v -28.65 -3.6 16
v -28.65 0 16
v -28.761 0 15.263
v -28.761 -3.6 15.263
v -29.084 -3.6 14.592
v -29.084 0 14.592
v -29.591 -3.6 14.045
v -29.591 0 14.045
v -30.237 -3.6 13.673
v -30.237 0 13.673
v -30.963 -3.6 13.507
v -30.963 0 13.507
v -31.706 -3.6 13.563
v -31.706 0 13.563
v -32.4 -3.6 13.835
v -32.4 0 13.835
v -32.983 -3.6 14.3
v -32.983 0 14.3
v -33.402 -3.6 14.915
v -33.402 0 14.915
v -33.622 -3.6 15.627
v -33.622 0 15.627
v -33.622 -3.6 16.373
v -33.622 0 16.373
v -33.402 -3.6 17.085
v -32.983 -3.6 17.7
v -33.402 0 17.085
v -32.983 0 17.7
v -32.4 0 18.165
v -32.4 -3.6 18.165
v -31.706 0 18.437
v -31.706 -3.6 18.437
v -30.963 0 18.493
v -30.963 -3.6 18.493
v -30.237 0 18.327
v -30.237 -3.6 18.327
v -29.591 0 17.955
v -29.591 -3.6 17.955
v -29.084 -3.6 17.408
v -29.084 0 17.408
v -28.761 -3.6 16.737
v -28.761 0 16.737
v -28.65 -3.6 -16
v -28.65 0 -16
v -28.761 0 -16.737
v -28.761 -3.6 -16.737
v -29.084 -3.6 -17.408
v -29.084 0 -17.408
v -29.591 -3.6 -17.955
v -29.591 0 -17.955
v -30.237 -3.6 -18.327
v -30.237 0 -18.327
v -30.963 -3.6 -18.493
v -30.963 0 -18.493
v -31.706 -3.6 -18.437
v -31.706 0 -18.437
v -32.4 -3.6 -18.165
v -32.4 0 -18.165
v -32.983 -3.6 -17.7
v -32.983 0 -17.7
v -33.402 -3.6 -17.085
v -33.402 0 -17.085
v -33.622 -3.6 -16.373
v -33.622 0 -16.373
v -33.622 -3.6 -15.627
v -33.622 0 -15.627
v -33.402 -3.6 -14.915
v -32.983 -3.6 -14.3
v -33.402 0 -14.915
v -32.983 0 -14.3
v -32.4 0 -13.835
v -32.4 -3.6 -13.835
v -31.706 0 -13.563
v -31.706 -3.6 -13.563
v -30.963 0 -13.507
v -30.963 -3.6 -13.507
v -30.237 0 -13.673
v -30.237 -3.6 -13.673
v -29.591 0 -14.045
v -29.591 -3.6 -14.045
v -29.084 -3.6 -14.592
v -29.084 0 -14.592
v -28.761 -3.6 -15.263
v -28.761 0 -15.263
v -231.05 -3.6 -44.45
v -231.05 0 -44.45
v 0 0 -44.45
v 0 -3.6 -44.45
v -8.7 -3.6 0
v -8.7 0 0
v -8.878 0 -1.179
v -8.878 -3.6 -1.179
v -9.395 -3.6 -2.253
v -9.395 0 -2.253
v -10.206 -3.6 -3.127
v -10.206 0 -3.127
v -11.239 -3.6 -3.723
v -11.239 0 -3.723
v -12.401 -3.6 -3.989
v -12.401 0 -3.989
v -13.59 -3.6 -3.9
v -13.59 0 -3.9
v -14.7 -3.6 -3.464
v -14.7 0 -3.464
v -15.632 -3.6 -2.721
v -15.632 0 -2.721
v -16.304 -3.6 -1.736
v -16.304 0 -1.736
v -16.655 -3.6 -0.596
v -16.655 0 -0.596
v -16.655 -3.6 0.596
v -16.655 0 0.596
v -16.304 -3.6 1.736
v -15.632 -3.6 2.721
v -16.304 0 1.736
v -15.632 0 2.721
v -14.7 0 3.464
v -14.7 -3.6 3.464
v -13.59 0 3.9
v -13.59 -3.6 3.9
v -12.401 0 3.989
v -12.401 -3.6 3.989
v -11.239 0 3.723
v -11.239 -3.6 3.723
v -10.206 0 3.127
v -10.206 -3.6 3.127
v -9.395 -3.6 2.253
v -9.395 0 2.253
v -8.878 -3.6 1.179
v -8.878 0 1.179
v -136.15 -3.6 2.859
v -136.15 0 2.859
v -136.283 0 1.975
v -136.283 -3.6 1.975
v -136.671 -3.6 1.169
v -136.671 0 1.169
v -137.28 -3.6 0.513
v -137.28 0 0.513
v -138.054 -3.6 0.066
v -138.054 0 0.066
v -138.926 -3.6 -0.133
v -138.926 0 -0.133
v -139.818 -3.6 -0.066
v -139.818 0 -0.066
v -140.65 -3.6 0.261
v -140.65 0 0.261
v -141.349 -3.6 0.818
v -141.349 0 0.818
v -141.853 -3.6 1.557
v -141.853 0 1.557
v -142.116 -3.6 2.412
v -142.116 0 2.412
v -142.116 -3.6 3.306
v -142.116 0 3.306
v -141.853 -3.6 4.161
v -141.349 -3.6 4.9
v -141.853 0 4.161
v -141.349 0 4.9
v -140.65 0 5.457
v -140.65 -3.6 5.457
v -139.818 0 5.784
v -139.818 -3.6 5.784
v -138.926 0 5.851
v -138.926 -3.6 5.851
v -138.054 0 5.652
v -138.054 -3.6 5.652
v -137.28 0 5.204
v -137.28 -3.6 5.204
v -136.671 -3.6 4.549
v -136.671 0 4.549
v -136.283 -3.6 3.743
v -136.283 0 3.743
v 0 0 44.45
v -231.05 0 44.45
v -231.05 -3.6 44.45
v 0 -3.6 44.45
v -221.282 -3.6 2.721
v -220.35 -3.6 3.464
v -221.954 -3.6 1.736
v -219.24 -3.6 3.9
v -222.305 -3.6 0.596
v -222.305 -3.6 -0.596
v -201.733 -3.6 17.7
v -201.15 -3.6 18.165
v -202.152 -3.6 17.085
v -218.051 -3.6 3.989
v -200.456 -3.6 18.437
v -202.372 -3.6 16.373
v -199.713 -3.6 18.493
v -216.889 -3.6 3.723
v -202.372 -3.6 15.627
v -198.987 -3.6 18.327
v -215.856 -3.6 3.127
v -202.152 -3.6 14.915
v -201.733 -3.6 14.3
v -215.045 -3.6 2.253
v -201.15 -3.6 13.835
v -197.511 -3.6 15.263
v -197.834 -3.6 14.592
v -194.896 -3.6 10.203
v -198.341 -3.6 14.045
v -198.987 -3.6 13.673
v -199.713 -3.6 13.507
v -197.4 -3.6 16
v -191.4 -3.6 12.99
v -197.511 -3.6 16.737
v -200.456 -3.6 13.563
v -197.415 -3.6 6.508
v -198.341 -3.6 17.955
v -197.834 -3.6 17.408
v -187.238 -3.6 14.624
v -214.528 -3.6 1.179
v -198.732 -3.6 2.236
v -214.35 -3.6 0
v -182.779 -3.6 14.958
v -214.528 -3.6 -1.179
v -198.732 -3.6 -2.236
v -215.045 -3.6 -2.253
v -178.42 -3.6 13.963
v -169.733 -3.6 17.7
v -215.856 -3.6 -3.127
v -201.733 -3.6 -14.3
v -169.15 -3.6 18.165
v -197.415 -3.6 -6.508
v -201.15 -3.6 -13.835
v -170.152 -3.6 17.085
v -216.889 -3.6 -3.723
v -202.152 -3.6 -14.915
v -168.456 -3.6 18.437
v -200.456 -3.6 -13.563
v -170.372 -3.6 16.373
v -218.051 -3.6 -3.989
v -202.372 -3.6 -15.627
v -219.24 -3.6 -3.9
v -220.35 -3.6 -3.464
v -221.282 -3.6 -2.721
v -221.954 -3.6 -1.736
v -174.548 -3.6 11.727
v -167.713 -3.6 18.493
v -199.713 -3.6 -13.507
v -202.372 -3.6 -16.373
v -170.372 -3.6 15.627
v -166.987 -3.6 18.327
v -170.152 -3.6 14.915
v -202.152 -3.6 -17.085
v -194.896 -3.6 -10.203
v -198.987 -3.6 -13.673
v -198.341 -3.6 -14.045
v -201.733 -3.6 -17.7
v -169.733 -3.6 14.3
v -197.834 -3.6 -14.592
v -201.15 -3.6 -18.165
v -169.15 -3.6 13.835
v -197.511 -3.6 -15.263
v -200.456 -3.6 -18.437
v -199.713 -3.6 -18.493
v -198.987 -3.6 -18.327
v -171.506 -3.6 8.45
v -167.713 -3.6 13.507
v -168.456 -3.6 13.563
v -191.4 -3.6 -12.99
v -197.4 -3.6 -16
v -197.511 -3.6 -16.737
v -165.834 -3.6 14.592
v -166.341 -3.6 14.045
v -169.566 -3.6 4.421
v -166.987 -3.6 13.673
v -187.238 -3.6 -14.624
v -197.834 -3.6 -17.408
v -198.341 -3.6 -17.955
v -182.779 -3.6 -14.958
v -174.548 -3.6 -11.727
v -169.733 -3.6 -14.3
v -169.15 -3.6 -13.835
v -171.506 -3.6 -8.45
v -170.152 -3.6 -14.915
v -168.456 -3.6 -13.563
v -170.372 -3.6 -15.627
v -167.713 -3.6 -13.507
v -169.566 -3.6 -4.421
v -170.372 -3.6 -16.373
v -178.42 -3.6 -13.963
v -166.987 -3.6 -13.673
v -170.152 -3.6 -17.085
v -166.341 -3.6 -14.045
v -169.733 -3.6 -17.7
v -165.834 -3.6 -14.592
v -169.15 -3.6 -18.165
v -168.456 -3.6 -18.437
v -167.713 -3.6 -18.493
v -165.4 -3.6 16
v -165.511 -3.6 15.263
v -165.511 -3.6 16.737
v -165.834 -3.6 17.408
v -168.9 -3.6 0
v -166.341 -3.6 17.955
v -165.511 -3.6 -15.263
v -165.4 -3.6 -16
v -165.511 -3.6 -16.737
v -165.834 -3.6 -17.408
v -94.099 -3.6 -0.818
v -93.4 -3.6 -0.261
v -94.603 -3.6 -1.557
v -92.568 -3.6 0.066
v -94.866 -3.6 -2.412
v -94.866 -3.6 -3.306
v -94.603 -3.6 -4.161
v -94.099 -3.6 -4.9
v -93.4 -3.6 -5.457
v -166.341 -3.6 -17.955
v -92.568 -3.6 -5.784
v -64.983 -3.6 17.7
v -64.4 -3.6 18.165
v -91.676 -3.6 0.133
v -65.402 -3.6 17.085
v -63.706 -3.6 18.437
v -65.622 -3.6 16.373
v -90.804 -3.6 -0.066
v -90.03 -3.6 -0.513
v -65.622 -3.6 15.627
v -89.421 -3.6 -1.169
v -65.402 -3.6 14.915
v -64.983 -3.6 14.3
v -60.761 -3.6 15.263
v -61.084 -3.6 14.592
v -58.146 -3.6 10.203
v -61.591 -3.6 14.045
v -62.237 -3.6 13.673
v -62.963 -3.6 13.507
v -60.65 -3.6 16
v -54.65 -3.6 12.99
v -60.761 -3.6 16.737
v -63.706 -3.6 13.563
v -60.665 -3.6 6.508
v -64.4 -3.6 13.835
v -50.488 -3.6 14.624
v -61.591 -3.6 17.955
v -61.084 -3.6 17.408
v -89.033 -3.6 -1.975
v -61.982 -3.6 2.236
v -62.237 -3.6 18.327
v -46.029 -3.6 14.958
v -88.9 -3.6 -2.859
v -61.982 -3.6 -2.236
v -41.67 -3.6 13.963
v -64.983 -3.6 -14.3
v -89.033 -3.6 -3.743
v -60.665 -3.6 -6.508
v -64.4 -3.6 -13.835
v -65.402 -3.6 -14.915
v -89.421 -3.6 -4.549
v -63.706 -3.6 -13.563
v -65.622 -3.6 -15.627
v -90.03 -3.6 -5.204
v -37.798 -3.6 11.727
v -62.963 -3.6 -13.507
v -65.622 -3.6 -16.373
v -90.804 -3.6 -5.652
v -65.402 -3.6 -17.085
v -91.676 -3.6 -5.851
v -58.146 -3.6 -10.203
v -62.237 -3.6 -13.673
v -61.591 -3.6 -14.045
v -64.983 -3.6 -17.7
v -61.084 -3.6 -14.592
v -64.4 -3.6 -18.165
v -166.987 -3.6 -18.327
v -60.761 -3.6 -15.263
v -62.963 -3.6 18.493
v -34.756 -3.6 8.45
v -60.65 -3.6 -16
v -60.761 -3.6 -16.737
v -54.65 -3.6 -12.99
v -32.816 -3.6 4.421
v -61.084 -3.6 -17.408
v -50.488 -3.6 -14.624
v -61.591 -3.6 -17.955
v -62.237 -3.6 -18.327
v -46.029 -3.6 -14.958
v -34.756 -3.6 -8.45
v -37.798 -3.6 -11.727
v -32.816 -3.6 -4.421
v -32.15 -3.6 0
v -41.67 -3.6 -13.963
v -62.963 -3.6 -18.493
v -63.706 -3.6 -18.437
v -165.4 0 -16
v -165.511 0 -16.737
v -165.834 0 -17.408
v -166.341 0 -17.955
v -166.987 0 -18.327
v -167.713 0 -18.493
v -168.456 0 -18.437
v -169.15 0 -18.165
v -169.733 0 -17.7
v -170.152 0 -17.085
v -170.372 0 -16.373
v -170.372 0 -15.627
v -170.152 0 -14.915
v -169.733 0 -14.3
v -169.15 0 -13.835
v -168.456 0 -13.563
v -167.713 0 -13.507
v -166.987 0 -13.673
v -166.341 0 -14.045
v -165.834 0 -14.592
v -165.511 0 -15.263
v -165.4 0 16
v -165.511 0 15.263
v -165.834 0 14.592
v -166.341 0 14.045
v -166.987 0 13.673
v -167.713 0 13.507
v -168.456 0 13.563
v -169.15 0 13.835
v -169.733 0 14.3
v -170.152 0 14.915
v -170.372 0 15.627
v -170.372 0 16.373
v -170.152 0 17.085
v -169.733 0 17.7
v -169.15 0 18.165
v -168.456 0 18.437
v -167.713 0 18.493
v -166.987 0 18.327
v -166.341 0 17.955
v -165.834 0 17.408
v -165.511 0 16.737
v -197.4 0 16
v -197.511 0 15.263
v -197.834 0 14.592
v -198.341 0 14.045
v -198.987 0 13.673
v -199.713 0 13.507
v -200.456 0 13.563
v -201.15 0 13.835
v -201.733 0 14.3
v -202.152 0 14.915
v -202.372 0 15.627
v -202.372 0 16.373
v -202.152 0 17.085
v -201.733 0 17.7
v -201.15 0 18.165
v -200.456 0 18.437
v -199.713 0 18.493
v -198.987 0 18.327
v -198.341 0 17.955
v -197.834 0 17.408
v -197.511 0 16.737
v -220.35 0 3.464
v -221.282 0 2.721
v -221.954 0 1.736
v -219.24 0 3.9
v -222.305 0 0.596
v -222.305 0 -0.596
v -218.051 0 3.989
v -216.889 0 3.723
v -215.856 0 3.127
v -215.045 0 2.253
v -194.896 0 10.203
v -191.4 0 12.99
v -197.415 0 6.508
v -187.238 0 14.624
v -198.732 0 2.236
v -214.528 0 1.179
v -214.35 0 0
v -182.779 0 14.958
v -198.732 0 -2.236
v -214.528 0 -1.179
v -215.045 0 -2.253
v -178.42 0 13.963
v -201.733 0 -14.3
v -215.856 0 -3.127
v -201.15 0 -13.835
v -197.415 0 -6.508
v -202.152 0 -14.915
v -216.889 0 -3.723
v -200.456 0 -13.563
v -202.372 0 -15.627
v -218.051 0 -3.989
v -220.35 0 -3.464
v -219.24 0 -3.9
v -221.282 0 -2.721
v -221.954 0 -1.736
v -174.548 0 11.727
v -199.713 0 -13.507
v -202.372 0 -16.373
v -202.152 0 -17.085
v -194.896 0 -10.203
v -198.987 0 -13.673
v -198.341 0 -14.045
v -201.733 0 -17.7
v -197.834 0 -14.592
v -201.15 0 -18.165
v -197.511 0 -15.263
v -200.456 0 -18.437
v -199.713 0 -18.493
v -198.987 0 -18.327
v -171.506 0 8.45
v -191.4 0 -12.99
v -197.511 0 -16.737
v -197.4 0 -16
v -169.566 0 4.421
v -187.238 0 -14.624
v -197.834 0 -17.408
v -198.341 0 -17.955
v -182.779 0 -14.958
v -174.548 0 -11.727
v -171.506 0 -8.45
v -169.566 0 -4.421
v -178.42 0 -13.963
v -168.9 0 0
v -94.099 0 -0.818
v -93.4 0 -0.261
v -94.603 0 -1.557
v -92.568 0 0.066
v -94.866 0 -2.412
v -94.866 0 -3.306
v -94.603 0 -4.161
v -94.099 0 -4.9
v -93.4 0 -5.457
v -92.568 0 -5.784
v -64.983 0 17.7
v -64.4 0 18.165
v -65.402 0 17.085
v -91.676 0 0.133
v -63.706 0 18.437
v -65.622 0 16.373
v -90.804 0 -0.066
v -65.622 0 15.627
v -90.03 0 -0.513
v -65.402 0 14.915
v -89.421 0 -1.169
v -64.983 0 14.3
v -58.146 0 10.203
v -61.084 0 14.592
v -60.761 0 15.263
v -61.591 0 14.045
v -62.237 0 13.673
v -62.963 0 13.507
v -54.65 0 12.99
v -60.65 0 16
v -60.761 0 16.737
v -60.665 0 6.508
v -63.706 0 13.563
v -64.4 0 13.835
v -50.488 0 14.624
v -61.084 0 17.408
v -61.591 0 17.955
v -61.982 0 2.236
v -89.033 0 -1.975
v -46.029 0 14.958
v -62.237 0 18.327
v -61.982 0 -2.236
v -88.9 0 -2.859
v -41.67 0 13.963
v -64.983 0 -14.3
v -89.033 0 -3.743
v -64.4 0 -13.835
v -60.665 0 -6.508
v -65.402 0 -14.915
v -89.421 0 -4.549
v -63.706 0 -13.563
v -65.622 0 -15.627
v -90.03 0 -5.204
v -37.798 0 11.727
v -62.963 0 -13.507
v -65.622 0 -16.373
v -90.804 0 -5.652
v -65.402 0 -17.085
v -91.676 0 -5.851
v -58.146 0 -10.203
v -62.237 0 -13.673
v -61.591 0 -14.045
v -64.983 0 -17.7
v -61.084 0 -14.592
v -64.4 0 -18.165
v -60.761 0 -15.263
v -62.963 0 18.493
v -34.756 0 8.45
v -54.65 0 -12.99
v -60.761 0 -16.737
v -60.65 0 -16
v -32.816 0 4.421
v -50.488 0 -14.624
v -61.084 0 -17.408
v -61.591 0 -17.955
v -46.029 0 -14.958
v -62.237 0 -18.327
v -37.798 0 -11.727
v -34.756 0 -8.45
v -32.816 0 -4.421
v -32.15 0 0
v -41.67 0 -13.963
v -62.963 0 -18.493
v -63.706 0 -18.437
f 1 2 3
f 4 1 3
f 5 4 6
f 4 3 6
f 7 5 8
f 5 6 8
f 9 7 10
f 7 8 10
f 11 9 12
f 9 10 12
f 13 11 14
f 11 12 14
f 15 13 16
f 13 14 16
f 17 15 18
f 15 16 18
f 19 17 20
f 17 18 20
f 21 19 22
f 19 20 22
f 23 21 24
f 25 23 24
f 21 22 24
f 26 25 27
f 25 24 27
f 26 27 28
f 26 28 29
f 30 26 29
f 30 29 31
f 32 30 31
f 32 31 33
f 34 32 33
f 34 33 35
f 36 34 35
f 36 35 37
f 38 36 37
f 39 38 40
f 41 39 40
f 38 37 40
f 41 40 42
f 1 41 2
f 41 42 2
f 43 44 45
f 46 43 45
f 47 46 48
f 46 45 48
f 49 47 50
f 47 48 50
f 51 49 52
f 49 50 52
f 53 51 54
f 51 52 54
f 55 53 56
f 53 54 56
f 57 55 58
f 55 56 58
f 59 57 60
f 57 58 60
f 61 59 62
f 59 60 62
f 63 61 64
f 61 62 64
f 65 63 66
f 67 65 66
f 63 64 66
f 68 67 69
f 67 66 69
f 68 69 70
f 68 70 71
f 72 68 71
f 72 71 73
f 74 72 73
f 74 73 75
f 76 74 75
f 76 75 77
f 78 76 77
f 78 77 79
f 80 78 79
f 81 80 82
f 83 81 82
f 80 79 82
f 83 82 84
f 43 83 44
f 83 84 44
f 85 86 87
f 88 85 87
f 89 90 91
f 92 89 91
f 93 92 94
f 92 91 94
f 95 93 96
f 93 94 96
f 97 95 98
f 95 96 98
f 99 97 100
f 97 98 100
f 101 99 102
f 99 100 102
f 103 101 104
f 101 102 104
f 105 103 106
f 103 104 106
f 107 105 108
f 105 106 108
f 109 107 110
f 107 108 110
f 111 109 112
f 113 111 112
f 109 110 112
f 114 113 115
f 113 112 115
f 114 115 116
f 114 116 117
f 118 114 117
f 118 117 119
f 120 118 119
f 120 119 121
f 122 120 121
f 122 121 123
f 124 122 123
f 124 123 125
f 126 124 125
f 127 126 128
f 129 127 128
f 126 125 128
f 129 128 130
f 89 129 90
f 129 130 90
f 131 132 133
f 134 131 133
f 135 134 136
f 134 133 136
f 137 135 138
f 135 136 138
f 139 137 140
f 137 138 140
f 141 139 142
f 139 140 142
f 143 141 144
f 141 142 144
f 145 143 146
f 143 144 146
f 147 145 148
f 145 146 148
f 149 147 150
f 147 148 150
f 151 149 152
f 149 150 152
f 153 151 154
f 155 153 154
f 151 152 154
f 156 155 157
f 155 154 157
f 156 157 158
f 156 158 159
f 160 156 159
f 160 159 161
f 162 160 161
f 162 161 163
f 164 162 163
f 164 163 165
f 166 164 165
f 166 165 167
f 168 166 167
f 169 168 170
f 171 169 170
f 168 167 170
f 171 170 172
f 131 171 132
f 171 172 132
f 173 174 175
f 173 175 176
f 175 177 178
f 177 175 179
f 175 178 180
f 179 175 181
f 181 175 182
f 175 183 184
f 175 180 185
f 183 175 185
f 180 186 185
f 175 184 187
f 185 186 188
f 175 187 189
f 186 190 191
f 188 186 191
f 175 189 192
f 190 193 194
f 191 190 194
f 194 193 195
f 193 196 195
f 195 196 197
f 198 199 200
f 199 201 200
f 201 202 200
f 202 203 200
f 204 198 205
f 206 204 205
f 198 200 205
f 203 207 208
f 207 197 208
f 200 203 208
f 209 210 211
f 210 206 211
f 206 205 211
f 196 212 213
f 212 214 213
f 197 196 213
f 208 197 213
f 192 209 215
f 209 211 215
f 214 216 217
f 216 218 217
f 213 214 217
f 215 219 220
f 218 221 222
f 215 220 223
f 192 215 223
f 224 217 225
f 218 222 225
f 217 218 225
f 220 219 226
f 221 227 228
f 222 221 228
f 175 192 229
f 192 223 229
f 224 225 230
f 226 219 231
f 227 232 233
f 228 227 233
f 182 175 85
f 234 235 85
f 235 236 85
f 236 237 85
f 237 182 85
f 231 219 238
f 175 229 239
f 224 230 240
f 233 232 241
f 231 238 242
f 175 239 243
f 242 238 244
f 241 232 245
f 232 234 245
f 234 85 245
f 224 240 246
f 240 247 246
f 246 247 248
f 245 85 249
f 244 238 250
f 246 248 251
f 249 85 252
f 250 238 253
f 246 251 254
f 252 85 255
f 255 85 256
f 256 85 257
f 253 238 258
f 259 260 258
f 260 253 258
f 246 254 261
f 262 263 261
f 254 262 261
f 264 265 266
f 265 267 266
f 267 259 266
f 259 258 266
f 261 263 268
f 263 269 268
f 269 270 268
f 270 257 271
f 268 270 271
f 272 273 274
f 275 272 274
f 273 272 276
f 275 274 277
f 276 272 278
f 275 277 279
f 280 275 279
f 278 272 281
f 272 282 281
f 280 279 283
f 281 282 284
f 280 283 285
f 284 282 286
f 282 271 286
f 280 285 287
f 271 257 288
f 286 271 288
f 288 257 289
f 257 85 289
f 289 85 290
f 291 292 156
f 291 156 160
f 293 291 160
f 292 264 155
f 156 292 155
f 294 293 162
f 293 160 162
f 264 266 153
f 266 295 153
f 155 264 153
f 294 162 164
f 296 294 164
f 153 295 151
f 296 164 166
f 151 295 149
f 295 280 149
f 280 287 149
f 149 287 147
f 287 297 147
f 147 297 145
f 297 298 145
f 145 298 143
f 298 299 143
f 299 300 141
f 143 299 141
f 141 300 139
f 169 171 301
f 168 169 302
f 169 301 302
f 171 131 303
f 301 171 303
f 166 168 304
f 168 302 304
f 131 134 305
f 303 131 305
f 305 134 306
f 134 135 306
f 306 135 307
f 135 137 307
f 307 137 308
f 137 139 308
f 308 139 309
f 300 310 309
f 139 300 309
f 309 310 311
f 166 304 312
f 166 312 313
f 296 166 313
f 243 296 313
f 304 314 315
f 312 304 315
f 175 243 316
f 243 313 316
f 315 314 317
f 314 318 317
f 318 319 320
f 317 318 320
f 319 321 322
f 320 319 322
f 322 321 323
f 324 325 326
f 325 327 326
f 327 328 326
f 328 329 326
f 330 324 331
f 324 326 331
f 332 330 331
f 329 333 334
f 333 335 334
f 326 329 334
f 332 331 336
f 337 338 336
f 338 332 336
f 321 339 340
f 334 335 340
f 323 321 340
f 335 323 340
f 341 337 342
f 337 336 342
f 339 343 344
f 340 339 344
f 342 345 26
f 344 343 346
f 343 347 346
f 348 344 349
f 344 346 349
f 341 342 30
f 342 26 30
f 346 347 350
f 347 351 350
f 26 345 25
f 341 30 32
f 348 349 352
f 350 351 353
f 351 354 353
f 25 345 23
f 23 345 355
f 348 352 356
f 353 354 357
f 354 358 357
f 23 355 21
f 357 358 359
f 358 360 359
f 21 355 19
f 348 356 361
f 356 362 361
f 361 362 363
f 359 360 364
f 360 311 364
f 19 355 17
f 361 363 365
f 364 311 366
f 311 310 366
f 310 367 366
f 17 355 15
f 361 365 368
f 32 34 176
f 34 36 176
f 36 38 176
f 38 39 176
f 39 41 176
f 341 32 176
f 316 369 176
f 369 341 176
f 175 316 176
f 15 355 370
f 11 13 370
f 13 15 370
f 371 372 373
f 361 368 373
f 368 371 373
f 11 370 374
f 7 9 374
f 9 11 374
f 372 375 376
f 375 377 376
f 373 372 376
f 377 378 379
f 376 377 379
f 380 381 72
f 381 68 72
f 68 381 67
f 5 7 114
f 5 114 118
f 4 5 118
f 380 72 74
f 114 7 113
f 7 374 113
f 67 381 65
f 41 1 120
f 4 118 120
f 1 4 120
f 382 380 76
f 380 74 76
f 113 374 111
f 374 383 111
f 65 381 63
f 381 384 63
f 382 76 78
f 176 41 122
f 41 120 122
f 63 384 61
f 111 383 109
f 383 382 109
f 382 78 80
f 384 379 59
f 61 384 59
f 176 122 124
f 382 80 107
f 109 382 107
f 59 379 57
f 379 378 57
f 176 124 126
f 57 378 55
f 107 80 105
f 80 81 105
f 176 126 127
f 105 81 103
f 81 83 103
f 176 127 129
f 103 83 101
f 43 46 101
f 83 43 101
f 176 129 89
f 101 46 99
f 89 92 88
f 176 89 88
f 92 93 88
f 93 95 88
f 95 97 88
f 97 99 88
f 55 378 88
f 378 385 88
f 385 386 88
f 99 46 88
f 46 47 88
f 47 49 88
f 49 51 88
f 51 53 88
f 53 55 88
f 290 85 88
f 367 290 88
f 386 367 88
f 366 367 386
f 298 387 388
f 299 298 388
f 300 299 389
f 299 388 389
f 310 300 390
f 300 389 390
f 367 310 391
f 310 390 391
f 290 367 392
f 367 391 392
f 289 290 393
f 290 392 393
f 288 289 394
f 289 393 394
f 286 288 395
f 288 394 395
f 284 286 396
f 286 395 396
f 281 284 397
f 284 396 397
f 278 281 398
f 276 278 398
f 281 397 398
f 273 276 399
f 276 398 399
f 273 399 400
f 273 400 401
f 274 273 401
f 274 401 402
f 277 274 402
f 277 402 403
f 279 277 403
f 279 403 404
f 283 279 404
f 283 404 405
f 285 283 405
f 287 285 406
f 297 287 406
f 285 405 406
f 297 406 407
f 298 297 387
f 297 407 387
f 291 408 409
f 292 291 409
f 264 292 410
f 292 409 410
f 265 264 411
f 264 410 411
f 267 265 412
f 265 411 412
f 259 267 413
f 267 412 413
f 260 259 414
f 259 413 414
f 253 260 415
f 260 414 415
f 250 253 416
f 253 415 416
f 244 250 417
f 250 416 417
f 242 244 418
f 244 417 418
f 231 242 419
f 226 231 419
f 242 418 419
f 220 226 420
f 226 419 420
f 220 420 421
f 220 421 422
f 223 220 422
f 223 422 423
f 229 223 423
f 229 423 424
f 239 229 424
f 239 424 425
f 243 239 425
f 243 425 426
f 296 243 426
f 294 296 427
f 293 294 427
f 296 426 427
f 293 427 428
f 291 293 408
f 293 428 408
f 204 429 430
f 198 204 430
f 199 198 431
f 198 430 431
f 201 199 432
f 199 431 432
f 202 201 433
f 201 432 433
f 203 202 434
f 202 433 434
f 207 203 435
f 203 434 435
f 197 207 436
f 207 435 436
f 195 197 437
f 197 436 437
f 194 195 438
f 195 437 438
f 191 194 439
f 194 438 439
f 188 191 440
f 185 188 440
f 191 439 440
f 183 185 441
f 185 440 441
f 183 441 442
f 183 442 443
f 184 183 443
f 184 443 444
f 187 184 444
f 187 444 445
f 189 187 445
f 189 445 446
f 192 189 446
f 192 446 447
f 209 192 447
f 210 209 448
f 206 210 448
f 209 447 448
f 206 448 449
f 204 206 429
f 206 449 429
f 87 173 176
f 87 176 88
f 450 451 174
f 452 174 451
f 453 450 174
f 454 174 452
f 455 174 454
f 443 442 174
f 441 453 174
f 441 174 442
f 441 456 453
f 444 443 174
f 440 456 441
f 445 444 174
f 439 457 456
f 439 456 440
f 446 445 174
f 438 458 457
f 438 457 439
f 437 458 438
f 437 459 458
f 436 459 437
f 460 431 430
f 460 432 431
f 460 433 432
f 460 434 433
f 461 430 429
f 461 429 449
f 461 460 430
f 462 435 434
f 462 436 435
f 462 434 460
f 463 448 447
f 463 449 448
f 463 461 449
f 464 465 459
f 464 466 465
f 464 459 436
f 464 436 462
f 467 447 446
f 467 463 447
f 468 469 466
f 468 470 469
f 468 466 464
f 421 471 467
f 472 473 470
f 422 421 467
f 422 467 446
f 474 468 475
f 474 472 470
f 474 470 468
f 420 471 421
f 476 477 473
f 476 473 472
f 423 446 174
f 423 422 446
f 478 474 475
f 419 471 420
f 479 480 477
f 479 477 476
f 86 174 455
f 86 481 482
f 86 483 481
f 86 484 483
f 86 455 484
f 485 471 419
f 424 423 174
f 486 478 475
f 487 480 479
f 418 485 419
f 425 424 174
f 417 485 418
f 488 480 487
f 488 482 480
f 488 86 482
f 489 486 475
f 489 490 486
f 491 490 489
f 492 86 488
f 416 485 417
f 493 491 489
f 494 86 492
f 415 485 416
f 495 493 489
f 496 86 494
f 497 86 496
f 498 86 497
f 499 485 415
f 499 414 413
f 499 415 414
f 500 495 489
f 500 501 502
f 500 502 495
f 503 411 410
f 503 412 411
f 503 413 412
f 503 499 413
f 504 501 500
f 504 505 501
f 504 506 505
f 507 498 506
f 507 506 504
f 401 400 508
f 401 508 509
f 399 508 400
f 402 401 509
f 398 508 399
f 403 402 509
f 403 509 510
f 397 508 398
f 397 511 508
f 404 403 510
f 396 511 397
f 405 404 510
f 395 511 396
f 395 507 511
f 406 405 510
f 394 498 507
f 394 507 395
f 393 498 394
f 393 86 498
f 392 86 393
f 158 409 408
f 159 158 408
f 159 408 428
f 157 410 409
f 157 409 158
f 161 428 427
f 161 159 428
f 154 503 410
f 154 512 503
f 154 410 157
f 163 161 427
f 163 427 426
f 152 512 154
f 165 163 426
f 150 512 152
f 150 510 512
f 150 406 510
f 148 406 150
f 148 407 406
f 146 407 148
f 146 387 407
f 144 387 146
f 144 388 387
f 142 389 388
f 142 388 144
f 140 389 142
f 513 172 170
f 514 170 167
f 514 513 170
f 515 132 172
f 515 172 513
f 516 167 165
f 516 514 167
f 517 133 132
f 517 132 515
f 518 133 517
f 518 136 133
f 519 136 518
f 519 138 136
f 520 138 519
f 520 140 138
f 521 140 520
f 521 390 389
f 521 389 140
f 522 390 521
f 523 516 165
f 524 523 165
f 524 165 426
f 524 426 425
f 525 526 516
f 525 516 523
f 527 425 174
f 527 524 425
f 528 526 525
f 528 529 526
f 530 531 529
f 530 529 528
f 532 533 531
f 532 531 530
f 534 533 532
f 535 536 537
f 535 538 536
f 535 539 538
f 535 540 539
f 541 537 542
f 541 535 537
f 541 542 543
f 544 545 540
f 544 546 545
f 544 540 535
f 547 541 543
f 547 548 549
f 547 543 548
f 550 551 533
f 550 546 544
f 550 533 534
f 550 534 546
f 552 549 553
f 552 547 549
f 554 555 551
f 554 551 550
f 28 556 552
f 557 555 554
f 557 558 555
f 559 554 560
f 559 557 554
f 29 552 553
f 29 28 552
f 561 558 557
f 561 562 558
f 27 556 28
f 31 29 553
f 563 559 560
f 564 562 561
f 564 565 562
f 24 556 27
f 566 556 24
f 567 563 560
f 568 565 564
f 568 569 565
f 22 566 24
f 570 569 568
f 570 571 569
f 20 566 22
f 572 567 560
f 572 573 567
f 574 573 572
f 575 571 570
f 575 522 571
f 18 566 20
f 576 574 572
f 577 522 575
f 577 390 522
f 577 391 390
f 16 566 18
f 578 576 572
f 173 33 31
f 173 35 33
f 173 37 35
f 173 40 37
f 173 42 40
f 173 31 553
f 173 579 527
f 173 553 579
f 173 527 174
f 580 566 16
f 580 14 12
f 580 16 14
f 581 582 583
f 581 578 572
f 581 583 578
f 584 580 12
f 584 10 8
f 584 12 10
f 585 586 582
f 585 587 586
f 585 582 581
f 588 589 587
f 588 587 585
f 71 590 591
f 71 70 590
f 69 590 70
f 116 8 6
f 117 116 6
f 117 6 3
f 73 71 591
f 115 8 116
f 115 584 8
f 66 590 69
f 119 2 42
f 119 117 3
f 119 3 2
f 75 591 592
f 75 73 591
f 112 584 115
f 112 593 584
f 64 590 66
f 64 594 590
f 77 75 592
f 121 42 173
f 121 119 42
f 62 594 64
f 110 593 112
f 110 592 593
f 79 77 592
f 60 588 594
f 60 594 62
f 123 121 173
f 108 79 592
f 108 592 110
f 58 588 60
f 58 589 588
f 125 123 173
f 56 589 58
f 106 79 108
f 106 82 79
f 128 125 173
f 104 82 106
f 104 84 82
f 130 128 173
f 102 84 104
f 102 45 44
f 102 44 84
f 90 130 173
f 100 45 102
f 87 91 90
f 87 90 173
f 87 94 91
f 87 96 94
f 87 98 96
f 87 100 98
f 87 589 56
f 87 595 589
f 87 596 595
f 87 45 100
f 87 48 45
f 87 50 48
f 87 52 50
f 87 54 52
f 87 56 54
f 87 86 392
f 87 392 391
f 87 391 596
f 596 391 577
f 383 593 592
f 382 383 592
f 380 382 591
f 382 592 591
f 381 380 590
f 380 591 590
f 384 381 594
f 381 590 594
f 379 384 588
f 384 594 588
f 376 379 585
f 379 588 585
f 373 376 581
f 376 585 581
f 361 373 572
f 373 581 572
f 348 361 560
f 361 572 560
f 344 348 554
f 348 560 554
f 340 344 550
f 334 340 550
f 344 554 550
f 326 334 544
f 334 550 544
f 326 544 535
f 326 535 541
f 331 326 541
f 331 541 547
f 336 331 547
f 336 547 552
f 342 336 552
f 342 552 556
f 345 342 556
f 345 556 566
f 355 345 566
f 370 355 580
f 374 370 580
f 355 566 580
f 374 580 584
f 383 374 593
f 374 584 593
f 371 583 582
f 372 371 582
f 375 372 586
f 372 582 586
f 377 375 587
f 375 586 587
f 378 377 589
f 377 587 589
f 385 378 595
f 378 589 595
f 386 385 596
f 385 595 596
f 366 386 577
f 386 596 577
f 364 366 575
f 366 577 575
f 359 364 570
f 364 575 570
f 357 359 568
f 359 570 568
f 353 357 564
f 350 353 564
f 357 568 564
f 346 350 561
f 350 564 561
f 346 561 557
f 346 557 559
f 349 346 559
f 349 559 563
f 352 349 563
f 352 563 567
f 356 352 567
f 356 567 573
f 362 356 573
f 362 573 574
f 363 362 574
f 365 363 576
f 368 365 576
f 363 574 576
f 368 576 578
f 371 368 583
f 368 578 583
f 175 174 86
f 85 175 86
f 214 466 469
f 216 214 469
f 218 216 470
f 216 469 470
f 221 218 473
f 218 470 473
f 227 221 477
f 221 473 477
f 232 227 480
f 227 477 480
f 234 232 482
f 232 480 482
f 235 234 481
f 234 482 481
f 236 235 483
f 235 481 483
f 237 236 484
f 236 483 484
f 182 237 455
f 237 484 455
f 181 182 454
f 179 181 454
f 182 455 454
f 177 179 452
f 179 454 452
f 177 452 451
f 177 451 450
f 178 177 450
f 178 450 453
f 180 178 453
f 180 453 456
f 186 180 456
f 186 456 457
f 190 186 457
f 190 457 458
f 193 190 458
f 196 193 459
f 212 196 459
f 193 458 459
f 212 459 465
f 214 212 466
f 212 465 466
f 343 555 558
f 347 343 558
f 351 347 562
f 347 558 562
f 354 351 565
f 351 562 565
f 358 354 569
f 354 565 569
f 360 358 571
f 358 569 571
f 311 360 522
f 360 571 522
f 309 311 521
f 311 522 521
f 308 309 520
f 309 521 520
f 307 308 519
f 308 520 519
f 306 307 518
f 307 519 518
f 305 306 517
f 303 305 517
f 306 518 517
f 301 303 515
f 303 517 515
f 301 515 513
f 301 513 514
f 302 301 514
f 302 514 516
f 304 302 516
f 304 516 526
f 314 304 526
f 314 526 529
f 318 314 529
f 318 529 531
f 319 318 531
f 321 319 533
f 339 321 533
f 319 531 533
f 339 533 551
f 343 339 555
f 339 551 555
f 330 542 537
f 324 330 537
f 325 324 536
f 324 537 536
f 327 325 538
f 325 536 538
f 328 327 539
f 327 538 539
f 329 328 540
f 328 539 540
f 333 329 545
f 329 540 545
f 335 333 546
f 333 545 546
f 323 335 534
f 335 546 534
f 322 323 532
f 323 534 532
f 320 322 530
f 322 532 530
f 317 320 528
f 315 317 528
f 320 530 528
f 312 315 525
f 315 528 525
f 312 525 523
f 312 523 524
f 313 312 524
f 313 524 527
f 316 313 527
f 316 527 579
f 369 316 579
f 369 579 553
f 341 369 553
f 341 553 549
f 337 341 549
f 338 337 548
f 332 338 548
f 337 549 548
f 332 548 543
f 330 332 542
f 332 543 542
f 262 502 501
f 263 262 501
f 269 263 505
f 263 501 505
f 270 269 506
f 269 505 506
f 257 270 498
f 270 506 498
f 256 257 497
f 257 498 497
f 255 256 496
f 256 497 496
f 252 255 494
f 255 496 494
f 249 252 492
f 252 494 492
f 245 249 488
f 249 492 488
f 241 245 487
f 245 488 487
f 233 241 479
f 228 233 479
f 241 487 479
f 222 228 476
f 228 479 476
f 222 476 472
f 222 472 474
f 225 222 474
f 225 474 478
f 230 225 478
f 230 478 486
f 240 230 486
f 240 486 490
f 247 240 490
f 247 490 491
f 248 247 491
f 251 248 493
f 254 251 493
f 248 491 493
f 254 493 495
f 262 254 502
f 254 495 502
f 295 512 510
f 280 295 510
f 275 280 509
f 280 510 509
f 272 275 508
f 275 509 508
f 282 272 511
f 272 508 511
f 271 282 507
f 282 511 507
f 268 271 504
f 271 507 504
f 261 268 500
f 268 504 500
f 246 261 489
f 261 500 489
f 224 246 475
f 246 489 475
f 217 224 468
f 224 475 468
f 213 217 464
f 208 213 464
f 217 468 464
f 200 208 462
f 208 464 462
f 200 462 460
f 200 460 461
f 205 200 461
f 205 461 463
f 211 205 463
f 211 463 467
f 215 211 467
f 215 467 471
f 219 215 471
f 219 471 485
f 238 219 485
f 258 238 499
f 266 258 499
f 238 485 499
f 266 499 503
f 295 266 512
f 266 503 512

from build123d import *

# Parameters (mm, degrees)
SKETCH1_W           = 231.05
SKETCH1_H           = 88.9
SKETCH1_R           = 15
SKETCH1_R_2         = 2.5
SKETCH1_R_3         = 3
SKETCH1_R_4         = 4
BOSS_EXTRUDE1_DEPTH = 3.6


with BuildPart() as part:
    # Sketch1 → Boss-Extrude1 (new body)
    with BuildSketch(Plane(origin=(0, 0, 0), x_dir=(1, 0, 0), z_dir=(0, 1, 0))):
        with Locations((-115.525, 0)):
            Rectangle(SKETCH1_W, SKETCH1_H)
        with Locations((-183.9, 0)):
            Circle(SKETCH1_R, mode=Mode.SUBTRACT)
        with Locations((-47.15, 0)):
            Circle(SKETCH1_R, mode=Mode.SUBTRACT)
        with Locations((-63.15, -16)):
            Circle(SKETCH1_R_2, mode=Mode.SUBTRACT)
        with Locations((-31.15, -16)):
            Circle(SKETCH1_R_2, mode=Mode.SUBTRACT)
        with Locations((-31.15, 16)):
            Circle(SKETCH1_R_2, mode=Mode.SUBTRACT)
        with Locations((-63.15, 16)):
            Circle(SKETCH1_R_2, mode=Mode.SUBTRACT)
        with Locations((-167.9, 16)):
            Circle(SKETCH1_R_2, mode=Mode.SUBTRACT)
        with Locations((-199.9, 16)):
            Circle(SKETCH1_R_2, mode=Mode.SUBTRACT)
        with Locations((-199.9, -16)):
            Circle(SKETCH1_R_2, mode=Mode.SUBTRACT)
        with Locations((-167.9, -16)):
            Circle(SKETCH1_R_2, mode=Mode.SUBTRACT)
        with Locations((-139.15, -2.858987694)):
            Circle(SKETCH1_R_3, mode=Mode.SUBTRACT)
        with Locations((-91.9, 2.858987694)):
            Circle(SKETCH1_R_3, mode=Mode.SUBTRACT)
        with Locations((-218.35, 0)):
            Circle(SKETCH1_R_4, mode=Mode.SUBTRACT)
        with Locations((-12.7, 0)):
            Circle(SKETCH1_R_4, mode=Mode.SUBTRACT)
    extrude(amount=-BOSS_EXTRUDE1_DEPTH)


solid = part.part
